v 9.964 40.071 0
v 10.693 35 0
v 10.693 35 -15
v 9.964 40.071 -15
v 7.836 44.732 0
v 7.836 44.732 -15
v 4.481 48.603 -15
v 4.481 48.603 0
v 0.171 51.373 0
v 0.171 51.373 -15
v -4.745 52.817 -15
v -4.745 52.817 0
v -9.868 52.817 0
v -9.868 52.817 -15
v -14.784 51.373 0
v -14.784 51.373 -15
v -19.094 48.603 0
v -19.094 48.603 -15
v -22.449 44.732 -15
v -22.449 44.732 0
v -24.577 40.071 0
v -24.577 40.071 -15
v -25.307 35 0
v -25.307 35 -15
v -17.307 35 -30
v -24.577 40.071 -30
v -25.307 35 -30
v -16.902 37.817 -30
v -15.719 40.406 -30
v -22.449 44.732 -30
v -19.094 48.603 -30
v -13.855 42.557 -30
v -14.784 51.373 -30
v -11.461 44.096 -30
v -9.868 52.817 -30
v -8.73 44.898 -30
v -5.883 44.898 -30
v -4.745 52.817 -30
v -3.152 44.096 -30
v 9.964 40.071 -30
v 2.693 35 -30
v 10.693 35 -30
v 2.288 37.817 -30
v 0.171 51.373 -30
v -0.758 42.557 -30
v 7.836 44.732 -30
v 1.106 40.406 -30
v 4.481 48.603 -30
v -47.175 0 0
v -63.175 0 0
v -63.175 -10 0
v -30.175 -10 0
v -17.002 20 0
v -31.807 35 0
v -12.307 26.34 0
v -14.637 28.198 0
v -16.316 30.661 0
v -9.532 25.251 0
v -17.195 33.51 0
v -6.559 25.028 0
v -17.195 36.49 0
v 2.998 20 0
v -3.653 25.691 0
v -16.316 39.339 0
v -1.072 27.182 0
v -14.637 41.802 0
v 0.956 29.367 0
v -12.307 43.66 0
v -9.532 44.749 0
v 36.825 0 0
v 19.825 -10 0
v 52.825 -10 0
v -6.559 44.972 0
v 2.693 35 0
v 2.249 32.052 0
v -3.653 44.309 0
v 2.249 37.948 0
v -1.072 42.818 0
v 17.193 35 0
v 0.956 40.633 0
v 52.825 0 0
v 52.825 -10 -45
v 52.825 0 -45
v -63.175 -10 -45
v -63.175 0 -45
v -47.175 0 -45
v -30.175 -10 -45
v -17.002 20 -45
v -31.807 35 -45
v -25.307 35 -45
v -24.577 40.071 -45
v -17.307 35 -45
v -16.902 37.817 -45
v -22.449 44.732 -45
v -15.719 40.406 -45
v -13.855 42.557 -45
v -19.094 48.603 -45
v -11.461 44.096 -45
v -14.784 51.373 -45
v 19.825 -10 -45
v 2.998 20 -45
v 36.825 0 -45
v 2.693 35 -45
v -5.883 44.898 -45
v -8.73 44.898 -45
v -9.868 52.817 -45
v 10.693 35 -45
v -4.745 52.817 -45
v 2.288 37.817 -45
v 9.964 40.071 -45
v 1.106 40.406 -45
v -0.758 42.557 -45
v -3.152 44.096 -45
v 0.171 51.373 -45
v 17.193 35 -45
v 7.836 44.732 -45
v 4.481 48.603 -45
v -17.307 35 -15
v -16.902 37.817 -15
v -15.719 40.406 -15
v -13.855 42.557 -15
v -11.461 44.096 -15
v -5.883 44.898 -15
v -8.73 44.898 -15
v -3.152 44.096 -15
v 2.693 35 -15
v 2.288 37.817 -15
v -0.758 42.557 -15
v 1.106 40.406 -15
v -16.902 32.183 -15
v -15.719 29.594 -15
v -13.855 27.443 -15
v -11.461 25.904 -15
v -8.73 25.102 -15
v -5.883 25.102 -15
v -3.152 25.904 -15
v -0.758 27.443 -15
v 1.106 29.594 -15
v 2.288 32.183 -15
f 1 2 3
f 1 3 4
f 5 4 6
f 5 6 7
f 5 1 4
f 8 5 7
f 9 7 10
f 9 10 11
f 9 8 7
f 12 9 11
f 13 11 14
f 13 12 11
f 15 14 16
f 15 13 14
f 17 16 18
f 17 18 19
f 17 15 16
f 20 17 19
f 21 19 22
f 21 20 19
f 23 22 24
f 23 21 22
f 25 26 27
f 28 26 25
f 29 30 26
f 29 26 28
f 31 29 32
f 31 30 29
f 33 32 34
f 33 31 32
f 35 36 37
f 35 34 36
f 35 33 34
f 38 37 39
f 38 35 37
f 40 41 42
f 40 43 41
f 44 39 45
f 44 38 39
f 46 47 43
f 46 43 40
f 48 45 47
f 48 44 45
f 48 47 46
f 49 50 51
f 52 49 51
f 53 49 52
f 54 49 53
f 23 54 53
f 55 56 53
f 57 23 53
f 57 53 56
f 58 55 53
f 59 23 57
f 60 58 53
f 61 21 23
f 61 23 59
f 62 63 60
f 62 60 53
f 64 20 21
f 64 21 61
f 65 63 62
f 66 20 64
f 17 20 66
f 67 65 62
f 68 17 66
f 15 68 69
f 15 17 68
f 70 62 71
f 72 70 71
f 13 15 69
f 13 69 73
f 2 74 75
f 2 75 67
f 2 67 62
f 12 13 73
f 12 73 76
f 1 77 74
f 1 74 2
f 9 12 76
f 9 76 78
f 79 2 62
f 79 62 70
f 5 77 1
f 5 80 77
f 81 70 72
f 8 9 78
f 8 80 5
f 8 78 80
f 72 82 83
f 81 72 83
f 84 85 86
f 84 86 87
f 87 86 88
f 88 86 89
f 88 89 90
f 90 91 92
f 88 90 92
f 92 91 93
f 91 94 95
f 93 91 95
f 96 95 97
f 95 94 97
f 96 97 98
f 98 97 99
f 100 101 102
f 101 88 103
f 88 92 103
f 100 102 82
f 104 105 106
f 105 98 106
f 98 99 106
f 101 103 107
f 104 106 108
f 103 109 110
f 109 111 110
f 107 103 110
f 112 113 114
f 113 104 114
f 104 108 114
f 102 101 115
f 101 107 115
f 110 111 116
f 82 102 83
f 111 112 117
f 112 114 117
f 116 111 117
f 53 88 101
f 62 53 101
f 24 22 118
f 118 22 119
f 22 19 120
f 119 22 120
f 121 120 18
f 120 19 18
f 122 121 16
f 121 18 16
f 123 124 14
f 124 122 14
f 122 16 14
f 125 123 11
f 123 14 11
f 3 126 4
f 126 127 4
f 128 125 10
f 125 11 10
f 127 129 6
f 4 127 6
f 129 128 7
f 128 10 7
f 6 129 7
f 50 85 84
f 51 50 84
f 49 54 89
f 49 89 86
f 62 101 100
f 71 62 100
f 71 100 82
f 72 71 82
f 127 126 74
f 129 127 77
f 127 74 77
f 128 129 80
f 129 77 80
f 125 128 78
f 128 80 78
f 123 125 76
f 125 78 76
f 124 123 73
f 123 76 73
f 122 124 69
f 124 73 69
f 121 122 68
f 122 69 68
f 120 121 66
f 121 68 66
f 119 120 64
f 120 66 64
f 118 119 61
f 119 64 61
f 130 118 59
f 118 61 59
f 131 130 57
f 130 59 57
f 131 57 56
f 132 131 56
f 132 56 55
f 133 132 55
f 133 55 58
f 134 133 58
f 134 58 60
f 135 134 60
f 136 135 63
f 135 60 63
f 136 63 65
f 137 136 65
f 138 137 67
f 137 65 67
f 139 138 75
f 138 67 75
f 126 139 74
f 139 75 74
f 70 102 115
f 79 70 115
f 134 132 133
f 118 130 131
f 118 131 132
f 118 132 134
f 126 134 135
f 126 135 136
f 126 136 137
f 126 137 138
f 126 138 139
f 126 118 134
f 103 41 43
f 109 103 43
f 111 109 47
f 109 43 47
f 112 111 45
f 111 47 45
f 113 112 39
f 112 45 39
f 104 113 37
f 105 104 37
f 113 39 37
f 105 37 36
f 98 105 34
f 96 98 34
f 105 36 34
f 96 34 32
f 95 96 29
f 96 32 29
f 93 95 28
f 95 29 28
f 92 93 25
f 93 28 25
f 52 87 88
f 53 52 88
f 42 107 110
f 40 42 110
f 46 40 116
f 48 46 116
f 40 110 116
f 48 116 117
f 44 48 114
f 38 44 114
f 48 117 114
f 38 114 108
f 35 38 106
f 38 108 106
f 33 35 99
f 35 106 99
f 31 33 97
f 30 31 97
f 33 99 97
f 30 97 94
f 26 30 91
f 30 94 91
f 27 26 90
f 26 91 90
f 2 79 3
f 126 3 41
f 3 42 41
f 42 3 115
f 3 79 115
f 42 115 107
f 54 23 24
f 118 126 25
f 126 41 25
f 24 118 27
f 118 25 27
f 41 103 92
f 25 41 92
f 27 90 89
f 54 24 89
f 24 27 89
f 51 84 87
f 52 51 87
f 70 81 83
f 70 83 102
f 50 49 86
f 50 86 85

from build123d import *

# Parameters (mm, degrees)
BOSS_EXTRUDE2_DEPTH = 30
BOSS_EXTRUDE4_DEPTH = 15
CUT_EXTRUDE1_DEPTH  = 94.941606783
CUT_EXTRUDE2_DEPTH  = 15


with BuildPart() as part:
    # Sketch1 → Boss-Extrude2 (new body)
    with BuildSketch(Plane.XY):
        Polygon((52.825436409, -10), (52.825436409, 0), (36.825436409, 0), (17.193398817, 35), (-31.806601183, 35), (-47.174563591, 0), (-63.174563591, 0), (-63.174563591, -10), (-30.174563591, -10), (-17.002024384, 20), (2.997975616, 20), (19.825436409, -10), align=None)
    boss_extrude2 = extrude(amount=-BOSS_EXTRUDE2_DEPTH)

    # Sketch4 → Boss-Extrude4 (add)
    with BuildSketch(Plane.XY):
        with BuildLine():
            ThreePointArc((10.693398817, 35), (-7.306601183, 53), (-25.306601183, 35))
            Line((-25.306601183, 35), (10.693398817, 35))
        make_face()
    boss_extrude4 = extrude(amount=-BOSS_EXTRUDE4_DEPTH)

    # Mirror1: Boss-Extrude2, Boss-Extrude4 across plane
    add(boss_extrude2.mirror(Plane(origin=(0, 0, -22.5), x_dir=(1, 0, 0), z_dir=(0, 0, -1))))
    add(boss_extrude4.mirror(Plane(origin=(0, 0, -22.5), x_dir=(1, 0, 0), z_dir=(0, 0, -1))))

    # Sketch5 → Cut-Extrude1 (cut, through all)
    with BuildSketch(Plane.XY):
        with BuildLine():
            ThreePointArc((2.693398817, 35), (-7.306601183, 45), (-17.306601183, 35))
            Line((-17.306601183, 35), (2.693398817, 35))
        make_face()
    extrude(amount=-CUT_EXTRUDE1_DEPTH, mode=Mode.SUBTRACT)

    # Sketch6 → Cut-Extrude2 (cut)
    with BuildSketch(Plane.XY):
        with BuildLine():
            ThreePointArc((2.693398817, 35), (-7.306601183, 45), (-17.306601183, 35))
            Line((-17.306601183, 35), (2.693398817, 35))
        make_face()
        with BuildLine():
            Line((2.693398817, 35), (-17.306601183, 35))
            ThreePointArc((-17.306601183, 35), (-7.306601183, 25), (2.693398817, 35))
        make_face()
    extrude(amount=-CUT_EXTRUDE2_DEPTH, mode=Mode.SUBTRACT)


solid = part.part
